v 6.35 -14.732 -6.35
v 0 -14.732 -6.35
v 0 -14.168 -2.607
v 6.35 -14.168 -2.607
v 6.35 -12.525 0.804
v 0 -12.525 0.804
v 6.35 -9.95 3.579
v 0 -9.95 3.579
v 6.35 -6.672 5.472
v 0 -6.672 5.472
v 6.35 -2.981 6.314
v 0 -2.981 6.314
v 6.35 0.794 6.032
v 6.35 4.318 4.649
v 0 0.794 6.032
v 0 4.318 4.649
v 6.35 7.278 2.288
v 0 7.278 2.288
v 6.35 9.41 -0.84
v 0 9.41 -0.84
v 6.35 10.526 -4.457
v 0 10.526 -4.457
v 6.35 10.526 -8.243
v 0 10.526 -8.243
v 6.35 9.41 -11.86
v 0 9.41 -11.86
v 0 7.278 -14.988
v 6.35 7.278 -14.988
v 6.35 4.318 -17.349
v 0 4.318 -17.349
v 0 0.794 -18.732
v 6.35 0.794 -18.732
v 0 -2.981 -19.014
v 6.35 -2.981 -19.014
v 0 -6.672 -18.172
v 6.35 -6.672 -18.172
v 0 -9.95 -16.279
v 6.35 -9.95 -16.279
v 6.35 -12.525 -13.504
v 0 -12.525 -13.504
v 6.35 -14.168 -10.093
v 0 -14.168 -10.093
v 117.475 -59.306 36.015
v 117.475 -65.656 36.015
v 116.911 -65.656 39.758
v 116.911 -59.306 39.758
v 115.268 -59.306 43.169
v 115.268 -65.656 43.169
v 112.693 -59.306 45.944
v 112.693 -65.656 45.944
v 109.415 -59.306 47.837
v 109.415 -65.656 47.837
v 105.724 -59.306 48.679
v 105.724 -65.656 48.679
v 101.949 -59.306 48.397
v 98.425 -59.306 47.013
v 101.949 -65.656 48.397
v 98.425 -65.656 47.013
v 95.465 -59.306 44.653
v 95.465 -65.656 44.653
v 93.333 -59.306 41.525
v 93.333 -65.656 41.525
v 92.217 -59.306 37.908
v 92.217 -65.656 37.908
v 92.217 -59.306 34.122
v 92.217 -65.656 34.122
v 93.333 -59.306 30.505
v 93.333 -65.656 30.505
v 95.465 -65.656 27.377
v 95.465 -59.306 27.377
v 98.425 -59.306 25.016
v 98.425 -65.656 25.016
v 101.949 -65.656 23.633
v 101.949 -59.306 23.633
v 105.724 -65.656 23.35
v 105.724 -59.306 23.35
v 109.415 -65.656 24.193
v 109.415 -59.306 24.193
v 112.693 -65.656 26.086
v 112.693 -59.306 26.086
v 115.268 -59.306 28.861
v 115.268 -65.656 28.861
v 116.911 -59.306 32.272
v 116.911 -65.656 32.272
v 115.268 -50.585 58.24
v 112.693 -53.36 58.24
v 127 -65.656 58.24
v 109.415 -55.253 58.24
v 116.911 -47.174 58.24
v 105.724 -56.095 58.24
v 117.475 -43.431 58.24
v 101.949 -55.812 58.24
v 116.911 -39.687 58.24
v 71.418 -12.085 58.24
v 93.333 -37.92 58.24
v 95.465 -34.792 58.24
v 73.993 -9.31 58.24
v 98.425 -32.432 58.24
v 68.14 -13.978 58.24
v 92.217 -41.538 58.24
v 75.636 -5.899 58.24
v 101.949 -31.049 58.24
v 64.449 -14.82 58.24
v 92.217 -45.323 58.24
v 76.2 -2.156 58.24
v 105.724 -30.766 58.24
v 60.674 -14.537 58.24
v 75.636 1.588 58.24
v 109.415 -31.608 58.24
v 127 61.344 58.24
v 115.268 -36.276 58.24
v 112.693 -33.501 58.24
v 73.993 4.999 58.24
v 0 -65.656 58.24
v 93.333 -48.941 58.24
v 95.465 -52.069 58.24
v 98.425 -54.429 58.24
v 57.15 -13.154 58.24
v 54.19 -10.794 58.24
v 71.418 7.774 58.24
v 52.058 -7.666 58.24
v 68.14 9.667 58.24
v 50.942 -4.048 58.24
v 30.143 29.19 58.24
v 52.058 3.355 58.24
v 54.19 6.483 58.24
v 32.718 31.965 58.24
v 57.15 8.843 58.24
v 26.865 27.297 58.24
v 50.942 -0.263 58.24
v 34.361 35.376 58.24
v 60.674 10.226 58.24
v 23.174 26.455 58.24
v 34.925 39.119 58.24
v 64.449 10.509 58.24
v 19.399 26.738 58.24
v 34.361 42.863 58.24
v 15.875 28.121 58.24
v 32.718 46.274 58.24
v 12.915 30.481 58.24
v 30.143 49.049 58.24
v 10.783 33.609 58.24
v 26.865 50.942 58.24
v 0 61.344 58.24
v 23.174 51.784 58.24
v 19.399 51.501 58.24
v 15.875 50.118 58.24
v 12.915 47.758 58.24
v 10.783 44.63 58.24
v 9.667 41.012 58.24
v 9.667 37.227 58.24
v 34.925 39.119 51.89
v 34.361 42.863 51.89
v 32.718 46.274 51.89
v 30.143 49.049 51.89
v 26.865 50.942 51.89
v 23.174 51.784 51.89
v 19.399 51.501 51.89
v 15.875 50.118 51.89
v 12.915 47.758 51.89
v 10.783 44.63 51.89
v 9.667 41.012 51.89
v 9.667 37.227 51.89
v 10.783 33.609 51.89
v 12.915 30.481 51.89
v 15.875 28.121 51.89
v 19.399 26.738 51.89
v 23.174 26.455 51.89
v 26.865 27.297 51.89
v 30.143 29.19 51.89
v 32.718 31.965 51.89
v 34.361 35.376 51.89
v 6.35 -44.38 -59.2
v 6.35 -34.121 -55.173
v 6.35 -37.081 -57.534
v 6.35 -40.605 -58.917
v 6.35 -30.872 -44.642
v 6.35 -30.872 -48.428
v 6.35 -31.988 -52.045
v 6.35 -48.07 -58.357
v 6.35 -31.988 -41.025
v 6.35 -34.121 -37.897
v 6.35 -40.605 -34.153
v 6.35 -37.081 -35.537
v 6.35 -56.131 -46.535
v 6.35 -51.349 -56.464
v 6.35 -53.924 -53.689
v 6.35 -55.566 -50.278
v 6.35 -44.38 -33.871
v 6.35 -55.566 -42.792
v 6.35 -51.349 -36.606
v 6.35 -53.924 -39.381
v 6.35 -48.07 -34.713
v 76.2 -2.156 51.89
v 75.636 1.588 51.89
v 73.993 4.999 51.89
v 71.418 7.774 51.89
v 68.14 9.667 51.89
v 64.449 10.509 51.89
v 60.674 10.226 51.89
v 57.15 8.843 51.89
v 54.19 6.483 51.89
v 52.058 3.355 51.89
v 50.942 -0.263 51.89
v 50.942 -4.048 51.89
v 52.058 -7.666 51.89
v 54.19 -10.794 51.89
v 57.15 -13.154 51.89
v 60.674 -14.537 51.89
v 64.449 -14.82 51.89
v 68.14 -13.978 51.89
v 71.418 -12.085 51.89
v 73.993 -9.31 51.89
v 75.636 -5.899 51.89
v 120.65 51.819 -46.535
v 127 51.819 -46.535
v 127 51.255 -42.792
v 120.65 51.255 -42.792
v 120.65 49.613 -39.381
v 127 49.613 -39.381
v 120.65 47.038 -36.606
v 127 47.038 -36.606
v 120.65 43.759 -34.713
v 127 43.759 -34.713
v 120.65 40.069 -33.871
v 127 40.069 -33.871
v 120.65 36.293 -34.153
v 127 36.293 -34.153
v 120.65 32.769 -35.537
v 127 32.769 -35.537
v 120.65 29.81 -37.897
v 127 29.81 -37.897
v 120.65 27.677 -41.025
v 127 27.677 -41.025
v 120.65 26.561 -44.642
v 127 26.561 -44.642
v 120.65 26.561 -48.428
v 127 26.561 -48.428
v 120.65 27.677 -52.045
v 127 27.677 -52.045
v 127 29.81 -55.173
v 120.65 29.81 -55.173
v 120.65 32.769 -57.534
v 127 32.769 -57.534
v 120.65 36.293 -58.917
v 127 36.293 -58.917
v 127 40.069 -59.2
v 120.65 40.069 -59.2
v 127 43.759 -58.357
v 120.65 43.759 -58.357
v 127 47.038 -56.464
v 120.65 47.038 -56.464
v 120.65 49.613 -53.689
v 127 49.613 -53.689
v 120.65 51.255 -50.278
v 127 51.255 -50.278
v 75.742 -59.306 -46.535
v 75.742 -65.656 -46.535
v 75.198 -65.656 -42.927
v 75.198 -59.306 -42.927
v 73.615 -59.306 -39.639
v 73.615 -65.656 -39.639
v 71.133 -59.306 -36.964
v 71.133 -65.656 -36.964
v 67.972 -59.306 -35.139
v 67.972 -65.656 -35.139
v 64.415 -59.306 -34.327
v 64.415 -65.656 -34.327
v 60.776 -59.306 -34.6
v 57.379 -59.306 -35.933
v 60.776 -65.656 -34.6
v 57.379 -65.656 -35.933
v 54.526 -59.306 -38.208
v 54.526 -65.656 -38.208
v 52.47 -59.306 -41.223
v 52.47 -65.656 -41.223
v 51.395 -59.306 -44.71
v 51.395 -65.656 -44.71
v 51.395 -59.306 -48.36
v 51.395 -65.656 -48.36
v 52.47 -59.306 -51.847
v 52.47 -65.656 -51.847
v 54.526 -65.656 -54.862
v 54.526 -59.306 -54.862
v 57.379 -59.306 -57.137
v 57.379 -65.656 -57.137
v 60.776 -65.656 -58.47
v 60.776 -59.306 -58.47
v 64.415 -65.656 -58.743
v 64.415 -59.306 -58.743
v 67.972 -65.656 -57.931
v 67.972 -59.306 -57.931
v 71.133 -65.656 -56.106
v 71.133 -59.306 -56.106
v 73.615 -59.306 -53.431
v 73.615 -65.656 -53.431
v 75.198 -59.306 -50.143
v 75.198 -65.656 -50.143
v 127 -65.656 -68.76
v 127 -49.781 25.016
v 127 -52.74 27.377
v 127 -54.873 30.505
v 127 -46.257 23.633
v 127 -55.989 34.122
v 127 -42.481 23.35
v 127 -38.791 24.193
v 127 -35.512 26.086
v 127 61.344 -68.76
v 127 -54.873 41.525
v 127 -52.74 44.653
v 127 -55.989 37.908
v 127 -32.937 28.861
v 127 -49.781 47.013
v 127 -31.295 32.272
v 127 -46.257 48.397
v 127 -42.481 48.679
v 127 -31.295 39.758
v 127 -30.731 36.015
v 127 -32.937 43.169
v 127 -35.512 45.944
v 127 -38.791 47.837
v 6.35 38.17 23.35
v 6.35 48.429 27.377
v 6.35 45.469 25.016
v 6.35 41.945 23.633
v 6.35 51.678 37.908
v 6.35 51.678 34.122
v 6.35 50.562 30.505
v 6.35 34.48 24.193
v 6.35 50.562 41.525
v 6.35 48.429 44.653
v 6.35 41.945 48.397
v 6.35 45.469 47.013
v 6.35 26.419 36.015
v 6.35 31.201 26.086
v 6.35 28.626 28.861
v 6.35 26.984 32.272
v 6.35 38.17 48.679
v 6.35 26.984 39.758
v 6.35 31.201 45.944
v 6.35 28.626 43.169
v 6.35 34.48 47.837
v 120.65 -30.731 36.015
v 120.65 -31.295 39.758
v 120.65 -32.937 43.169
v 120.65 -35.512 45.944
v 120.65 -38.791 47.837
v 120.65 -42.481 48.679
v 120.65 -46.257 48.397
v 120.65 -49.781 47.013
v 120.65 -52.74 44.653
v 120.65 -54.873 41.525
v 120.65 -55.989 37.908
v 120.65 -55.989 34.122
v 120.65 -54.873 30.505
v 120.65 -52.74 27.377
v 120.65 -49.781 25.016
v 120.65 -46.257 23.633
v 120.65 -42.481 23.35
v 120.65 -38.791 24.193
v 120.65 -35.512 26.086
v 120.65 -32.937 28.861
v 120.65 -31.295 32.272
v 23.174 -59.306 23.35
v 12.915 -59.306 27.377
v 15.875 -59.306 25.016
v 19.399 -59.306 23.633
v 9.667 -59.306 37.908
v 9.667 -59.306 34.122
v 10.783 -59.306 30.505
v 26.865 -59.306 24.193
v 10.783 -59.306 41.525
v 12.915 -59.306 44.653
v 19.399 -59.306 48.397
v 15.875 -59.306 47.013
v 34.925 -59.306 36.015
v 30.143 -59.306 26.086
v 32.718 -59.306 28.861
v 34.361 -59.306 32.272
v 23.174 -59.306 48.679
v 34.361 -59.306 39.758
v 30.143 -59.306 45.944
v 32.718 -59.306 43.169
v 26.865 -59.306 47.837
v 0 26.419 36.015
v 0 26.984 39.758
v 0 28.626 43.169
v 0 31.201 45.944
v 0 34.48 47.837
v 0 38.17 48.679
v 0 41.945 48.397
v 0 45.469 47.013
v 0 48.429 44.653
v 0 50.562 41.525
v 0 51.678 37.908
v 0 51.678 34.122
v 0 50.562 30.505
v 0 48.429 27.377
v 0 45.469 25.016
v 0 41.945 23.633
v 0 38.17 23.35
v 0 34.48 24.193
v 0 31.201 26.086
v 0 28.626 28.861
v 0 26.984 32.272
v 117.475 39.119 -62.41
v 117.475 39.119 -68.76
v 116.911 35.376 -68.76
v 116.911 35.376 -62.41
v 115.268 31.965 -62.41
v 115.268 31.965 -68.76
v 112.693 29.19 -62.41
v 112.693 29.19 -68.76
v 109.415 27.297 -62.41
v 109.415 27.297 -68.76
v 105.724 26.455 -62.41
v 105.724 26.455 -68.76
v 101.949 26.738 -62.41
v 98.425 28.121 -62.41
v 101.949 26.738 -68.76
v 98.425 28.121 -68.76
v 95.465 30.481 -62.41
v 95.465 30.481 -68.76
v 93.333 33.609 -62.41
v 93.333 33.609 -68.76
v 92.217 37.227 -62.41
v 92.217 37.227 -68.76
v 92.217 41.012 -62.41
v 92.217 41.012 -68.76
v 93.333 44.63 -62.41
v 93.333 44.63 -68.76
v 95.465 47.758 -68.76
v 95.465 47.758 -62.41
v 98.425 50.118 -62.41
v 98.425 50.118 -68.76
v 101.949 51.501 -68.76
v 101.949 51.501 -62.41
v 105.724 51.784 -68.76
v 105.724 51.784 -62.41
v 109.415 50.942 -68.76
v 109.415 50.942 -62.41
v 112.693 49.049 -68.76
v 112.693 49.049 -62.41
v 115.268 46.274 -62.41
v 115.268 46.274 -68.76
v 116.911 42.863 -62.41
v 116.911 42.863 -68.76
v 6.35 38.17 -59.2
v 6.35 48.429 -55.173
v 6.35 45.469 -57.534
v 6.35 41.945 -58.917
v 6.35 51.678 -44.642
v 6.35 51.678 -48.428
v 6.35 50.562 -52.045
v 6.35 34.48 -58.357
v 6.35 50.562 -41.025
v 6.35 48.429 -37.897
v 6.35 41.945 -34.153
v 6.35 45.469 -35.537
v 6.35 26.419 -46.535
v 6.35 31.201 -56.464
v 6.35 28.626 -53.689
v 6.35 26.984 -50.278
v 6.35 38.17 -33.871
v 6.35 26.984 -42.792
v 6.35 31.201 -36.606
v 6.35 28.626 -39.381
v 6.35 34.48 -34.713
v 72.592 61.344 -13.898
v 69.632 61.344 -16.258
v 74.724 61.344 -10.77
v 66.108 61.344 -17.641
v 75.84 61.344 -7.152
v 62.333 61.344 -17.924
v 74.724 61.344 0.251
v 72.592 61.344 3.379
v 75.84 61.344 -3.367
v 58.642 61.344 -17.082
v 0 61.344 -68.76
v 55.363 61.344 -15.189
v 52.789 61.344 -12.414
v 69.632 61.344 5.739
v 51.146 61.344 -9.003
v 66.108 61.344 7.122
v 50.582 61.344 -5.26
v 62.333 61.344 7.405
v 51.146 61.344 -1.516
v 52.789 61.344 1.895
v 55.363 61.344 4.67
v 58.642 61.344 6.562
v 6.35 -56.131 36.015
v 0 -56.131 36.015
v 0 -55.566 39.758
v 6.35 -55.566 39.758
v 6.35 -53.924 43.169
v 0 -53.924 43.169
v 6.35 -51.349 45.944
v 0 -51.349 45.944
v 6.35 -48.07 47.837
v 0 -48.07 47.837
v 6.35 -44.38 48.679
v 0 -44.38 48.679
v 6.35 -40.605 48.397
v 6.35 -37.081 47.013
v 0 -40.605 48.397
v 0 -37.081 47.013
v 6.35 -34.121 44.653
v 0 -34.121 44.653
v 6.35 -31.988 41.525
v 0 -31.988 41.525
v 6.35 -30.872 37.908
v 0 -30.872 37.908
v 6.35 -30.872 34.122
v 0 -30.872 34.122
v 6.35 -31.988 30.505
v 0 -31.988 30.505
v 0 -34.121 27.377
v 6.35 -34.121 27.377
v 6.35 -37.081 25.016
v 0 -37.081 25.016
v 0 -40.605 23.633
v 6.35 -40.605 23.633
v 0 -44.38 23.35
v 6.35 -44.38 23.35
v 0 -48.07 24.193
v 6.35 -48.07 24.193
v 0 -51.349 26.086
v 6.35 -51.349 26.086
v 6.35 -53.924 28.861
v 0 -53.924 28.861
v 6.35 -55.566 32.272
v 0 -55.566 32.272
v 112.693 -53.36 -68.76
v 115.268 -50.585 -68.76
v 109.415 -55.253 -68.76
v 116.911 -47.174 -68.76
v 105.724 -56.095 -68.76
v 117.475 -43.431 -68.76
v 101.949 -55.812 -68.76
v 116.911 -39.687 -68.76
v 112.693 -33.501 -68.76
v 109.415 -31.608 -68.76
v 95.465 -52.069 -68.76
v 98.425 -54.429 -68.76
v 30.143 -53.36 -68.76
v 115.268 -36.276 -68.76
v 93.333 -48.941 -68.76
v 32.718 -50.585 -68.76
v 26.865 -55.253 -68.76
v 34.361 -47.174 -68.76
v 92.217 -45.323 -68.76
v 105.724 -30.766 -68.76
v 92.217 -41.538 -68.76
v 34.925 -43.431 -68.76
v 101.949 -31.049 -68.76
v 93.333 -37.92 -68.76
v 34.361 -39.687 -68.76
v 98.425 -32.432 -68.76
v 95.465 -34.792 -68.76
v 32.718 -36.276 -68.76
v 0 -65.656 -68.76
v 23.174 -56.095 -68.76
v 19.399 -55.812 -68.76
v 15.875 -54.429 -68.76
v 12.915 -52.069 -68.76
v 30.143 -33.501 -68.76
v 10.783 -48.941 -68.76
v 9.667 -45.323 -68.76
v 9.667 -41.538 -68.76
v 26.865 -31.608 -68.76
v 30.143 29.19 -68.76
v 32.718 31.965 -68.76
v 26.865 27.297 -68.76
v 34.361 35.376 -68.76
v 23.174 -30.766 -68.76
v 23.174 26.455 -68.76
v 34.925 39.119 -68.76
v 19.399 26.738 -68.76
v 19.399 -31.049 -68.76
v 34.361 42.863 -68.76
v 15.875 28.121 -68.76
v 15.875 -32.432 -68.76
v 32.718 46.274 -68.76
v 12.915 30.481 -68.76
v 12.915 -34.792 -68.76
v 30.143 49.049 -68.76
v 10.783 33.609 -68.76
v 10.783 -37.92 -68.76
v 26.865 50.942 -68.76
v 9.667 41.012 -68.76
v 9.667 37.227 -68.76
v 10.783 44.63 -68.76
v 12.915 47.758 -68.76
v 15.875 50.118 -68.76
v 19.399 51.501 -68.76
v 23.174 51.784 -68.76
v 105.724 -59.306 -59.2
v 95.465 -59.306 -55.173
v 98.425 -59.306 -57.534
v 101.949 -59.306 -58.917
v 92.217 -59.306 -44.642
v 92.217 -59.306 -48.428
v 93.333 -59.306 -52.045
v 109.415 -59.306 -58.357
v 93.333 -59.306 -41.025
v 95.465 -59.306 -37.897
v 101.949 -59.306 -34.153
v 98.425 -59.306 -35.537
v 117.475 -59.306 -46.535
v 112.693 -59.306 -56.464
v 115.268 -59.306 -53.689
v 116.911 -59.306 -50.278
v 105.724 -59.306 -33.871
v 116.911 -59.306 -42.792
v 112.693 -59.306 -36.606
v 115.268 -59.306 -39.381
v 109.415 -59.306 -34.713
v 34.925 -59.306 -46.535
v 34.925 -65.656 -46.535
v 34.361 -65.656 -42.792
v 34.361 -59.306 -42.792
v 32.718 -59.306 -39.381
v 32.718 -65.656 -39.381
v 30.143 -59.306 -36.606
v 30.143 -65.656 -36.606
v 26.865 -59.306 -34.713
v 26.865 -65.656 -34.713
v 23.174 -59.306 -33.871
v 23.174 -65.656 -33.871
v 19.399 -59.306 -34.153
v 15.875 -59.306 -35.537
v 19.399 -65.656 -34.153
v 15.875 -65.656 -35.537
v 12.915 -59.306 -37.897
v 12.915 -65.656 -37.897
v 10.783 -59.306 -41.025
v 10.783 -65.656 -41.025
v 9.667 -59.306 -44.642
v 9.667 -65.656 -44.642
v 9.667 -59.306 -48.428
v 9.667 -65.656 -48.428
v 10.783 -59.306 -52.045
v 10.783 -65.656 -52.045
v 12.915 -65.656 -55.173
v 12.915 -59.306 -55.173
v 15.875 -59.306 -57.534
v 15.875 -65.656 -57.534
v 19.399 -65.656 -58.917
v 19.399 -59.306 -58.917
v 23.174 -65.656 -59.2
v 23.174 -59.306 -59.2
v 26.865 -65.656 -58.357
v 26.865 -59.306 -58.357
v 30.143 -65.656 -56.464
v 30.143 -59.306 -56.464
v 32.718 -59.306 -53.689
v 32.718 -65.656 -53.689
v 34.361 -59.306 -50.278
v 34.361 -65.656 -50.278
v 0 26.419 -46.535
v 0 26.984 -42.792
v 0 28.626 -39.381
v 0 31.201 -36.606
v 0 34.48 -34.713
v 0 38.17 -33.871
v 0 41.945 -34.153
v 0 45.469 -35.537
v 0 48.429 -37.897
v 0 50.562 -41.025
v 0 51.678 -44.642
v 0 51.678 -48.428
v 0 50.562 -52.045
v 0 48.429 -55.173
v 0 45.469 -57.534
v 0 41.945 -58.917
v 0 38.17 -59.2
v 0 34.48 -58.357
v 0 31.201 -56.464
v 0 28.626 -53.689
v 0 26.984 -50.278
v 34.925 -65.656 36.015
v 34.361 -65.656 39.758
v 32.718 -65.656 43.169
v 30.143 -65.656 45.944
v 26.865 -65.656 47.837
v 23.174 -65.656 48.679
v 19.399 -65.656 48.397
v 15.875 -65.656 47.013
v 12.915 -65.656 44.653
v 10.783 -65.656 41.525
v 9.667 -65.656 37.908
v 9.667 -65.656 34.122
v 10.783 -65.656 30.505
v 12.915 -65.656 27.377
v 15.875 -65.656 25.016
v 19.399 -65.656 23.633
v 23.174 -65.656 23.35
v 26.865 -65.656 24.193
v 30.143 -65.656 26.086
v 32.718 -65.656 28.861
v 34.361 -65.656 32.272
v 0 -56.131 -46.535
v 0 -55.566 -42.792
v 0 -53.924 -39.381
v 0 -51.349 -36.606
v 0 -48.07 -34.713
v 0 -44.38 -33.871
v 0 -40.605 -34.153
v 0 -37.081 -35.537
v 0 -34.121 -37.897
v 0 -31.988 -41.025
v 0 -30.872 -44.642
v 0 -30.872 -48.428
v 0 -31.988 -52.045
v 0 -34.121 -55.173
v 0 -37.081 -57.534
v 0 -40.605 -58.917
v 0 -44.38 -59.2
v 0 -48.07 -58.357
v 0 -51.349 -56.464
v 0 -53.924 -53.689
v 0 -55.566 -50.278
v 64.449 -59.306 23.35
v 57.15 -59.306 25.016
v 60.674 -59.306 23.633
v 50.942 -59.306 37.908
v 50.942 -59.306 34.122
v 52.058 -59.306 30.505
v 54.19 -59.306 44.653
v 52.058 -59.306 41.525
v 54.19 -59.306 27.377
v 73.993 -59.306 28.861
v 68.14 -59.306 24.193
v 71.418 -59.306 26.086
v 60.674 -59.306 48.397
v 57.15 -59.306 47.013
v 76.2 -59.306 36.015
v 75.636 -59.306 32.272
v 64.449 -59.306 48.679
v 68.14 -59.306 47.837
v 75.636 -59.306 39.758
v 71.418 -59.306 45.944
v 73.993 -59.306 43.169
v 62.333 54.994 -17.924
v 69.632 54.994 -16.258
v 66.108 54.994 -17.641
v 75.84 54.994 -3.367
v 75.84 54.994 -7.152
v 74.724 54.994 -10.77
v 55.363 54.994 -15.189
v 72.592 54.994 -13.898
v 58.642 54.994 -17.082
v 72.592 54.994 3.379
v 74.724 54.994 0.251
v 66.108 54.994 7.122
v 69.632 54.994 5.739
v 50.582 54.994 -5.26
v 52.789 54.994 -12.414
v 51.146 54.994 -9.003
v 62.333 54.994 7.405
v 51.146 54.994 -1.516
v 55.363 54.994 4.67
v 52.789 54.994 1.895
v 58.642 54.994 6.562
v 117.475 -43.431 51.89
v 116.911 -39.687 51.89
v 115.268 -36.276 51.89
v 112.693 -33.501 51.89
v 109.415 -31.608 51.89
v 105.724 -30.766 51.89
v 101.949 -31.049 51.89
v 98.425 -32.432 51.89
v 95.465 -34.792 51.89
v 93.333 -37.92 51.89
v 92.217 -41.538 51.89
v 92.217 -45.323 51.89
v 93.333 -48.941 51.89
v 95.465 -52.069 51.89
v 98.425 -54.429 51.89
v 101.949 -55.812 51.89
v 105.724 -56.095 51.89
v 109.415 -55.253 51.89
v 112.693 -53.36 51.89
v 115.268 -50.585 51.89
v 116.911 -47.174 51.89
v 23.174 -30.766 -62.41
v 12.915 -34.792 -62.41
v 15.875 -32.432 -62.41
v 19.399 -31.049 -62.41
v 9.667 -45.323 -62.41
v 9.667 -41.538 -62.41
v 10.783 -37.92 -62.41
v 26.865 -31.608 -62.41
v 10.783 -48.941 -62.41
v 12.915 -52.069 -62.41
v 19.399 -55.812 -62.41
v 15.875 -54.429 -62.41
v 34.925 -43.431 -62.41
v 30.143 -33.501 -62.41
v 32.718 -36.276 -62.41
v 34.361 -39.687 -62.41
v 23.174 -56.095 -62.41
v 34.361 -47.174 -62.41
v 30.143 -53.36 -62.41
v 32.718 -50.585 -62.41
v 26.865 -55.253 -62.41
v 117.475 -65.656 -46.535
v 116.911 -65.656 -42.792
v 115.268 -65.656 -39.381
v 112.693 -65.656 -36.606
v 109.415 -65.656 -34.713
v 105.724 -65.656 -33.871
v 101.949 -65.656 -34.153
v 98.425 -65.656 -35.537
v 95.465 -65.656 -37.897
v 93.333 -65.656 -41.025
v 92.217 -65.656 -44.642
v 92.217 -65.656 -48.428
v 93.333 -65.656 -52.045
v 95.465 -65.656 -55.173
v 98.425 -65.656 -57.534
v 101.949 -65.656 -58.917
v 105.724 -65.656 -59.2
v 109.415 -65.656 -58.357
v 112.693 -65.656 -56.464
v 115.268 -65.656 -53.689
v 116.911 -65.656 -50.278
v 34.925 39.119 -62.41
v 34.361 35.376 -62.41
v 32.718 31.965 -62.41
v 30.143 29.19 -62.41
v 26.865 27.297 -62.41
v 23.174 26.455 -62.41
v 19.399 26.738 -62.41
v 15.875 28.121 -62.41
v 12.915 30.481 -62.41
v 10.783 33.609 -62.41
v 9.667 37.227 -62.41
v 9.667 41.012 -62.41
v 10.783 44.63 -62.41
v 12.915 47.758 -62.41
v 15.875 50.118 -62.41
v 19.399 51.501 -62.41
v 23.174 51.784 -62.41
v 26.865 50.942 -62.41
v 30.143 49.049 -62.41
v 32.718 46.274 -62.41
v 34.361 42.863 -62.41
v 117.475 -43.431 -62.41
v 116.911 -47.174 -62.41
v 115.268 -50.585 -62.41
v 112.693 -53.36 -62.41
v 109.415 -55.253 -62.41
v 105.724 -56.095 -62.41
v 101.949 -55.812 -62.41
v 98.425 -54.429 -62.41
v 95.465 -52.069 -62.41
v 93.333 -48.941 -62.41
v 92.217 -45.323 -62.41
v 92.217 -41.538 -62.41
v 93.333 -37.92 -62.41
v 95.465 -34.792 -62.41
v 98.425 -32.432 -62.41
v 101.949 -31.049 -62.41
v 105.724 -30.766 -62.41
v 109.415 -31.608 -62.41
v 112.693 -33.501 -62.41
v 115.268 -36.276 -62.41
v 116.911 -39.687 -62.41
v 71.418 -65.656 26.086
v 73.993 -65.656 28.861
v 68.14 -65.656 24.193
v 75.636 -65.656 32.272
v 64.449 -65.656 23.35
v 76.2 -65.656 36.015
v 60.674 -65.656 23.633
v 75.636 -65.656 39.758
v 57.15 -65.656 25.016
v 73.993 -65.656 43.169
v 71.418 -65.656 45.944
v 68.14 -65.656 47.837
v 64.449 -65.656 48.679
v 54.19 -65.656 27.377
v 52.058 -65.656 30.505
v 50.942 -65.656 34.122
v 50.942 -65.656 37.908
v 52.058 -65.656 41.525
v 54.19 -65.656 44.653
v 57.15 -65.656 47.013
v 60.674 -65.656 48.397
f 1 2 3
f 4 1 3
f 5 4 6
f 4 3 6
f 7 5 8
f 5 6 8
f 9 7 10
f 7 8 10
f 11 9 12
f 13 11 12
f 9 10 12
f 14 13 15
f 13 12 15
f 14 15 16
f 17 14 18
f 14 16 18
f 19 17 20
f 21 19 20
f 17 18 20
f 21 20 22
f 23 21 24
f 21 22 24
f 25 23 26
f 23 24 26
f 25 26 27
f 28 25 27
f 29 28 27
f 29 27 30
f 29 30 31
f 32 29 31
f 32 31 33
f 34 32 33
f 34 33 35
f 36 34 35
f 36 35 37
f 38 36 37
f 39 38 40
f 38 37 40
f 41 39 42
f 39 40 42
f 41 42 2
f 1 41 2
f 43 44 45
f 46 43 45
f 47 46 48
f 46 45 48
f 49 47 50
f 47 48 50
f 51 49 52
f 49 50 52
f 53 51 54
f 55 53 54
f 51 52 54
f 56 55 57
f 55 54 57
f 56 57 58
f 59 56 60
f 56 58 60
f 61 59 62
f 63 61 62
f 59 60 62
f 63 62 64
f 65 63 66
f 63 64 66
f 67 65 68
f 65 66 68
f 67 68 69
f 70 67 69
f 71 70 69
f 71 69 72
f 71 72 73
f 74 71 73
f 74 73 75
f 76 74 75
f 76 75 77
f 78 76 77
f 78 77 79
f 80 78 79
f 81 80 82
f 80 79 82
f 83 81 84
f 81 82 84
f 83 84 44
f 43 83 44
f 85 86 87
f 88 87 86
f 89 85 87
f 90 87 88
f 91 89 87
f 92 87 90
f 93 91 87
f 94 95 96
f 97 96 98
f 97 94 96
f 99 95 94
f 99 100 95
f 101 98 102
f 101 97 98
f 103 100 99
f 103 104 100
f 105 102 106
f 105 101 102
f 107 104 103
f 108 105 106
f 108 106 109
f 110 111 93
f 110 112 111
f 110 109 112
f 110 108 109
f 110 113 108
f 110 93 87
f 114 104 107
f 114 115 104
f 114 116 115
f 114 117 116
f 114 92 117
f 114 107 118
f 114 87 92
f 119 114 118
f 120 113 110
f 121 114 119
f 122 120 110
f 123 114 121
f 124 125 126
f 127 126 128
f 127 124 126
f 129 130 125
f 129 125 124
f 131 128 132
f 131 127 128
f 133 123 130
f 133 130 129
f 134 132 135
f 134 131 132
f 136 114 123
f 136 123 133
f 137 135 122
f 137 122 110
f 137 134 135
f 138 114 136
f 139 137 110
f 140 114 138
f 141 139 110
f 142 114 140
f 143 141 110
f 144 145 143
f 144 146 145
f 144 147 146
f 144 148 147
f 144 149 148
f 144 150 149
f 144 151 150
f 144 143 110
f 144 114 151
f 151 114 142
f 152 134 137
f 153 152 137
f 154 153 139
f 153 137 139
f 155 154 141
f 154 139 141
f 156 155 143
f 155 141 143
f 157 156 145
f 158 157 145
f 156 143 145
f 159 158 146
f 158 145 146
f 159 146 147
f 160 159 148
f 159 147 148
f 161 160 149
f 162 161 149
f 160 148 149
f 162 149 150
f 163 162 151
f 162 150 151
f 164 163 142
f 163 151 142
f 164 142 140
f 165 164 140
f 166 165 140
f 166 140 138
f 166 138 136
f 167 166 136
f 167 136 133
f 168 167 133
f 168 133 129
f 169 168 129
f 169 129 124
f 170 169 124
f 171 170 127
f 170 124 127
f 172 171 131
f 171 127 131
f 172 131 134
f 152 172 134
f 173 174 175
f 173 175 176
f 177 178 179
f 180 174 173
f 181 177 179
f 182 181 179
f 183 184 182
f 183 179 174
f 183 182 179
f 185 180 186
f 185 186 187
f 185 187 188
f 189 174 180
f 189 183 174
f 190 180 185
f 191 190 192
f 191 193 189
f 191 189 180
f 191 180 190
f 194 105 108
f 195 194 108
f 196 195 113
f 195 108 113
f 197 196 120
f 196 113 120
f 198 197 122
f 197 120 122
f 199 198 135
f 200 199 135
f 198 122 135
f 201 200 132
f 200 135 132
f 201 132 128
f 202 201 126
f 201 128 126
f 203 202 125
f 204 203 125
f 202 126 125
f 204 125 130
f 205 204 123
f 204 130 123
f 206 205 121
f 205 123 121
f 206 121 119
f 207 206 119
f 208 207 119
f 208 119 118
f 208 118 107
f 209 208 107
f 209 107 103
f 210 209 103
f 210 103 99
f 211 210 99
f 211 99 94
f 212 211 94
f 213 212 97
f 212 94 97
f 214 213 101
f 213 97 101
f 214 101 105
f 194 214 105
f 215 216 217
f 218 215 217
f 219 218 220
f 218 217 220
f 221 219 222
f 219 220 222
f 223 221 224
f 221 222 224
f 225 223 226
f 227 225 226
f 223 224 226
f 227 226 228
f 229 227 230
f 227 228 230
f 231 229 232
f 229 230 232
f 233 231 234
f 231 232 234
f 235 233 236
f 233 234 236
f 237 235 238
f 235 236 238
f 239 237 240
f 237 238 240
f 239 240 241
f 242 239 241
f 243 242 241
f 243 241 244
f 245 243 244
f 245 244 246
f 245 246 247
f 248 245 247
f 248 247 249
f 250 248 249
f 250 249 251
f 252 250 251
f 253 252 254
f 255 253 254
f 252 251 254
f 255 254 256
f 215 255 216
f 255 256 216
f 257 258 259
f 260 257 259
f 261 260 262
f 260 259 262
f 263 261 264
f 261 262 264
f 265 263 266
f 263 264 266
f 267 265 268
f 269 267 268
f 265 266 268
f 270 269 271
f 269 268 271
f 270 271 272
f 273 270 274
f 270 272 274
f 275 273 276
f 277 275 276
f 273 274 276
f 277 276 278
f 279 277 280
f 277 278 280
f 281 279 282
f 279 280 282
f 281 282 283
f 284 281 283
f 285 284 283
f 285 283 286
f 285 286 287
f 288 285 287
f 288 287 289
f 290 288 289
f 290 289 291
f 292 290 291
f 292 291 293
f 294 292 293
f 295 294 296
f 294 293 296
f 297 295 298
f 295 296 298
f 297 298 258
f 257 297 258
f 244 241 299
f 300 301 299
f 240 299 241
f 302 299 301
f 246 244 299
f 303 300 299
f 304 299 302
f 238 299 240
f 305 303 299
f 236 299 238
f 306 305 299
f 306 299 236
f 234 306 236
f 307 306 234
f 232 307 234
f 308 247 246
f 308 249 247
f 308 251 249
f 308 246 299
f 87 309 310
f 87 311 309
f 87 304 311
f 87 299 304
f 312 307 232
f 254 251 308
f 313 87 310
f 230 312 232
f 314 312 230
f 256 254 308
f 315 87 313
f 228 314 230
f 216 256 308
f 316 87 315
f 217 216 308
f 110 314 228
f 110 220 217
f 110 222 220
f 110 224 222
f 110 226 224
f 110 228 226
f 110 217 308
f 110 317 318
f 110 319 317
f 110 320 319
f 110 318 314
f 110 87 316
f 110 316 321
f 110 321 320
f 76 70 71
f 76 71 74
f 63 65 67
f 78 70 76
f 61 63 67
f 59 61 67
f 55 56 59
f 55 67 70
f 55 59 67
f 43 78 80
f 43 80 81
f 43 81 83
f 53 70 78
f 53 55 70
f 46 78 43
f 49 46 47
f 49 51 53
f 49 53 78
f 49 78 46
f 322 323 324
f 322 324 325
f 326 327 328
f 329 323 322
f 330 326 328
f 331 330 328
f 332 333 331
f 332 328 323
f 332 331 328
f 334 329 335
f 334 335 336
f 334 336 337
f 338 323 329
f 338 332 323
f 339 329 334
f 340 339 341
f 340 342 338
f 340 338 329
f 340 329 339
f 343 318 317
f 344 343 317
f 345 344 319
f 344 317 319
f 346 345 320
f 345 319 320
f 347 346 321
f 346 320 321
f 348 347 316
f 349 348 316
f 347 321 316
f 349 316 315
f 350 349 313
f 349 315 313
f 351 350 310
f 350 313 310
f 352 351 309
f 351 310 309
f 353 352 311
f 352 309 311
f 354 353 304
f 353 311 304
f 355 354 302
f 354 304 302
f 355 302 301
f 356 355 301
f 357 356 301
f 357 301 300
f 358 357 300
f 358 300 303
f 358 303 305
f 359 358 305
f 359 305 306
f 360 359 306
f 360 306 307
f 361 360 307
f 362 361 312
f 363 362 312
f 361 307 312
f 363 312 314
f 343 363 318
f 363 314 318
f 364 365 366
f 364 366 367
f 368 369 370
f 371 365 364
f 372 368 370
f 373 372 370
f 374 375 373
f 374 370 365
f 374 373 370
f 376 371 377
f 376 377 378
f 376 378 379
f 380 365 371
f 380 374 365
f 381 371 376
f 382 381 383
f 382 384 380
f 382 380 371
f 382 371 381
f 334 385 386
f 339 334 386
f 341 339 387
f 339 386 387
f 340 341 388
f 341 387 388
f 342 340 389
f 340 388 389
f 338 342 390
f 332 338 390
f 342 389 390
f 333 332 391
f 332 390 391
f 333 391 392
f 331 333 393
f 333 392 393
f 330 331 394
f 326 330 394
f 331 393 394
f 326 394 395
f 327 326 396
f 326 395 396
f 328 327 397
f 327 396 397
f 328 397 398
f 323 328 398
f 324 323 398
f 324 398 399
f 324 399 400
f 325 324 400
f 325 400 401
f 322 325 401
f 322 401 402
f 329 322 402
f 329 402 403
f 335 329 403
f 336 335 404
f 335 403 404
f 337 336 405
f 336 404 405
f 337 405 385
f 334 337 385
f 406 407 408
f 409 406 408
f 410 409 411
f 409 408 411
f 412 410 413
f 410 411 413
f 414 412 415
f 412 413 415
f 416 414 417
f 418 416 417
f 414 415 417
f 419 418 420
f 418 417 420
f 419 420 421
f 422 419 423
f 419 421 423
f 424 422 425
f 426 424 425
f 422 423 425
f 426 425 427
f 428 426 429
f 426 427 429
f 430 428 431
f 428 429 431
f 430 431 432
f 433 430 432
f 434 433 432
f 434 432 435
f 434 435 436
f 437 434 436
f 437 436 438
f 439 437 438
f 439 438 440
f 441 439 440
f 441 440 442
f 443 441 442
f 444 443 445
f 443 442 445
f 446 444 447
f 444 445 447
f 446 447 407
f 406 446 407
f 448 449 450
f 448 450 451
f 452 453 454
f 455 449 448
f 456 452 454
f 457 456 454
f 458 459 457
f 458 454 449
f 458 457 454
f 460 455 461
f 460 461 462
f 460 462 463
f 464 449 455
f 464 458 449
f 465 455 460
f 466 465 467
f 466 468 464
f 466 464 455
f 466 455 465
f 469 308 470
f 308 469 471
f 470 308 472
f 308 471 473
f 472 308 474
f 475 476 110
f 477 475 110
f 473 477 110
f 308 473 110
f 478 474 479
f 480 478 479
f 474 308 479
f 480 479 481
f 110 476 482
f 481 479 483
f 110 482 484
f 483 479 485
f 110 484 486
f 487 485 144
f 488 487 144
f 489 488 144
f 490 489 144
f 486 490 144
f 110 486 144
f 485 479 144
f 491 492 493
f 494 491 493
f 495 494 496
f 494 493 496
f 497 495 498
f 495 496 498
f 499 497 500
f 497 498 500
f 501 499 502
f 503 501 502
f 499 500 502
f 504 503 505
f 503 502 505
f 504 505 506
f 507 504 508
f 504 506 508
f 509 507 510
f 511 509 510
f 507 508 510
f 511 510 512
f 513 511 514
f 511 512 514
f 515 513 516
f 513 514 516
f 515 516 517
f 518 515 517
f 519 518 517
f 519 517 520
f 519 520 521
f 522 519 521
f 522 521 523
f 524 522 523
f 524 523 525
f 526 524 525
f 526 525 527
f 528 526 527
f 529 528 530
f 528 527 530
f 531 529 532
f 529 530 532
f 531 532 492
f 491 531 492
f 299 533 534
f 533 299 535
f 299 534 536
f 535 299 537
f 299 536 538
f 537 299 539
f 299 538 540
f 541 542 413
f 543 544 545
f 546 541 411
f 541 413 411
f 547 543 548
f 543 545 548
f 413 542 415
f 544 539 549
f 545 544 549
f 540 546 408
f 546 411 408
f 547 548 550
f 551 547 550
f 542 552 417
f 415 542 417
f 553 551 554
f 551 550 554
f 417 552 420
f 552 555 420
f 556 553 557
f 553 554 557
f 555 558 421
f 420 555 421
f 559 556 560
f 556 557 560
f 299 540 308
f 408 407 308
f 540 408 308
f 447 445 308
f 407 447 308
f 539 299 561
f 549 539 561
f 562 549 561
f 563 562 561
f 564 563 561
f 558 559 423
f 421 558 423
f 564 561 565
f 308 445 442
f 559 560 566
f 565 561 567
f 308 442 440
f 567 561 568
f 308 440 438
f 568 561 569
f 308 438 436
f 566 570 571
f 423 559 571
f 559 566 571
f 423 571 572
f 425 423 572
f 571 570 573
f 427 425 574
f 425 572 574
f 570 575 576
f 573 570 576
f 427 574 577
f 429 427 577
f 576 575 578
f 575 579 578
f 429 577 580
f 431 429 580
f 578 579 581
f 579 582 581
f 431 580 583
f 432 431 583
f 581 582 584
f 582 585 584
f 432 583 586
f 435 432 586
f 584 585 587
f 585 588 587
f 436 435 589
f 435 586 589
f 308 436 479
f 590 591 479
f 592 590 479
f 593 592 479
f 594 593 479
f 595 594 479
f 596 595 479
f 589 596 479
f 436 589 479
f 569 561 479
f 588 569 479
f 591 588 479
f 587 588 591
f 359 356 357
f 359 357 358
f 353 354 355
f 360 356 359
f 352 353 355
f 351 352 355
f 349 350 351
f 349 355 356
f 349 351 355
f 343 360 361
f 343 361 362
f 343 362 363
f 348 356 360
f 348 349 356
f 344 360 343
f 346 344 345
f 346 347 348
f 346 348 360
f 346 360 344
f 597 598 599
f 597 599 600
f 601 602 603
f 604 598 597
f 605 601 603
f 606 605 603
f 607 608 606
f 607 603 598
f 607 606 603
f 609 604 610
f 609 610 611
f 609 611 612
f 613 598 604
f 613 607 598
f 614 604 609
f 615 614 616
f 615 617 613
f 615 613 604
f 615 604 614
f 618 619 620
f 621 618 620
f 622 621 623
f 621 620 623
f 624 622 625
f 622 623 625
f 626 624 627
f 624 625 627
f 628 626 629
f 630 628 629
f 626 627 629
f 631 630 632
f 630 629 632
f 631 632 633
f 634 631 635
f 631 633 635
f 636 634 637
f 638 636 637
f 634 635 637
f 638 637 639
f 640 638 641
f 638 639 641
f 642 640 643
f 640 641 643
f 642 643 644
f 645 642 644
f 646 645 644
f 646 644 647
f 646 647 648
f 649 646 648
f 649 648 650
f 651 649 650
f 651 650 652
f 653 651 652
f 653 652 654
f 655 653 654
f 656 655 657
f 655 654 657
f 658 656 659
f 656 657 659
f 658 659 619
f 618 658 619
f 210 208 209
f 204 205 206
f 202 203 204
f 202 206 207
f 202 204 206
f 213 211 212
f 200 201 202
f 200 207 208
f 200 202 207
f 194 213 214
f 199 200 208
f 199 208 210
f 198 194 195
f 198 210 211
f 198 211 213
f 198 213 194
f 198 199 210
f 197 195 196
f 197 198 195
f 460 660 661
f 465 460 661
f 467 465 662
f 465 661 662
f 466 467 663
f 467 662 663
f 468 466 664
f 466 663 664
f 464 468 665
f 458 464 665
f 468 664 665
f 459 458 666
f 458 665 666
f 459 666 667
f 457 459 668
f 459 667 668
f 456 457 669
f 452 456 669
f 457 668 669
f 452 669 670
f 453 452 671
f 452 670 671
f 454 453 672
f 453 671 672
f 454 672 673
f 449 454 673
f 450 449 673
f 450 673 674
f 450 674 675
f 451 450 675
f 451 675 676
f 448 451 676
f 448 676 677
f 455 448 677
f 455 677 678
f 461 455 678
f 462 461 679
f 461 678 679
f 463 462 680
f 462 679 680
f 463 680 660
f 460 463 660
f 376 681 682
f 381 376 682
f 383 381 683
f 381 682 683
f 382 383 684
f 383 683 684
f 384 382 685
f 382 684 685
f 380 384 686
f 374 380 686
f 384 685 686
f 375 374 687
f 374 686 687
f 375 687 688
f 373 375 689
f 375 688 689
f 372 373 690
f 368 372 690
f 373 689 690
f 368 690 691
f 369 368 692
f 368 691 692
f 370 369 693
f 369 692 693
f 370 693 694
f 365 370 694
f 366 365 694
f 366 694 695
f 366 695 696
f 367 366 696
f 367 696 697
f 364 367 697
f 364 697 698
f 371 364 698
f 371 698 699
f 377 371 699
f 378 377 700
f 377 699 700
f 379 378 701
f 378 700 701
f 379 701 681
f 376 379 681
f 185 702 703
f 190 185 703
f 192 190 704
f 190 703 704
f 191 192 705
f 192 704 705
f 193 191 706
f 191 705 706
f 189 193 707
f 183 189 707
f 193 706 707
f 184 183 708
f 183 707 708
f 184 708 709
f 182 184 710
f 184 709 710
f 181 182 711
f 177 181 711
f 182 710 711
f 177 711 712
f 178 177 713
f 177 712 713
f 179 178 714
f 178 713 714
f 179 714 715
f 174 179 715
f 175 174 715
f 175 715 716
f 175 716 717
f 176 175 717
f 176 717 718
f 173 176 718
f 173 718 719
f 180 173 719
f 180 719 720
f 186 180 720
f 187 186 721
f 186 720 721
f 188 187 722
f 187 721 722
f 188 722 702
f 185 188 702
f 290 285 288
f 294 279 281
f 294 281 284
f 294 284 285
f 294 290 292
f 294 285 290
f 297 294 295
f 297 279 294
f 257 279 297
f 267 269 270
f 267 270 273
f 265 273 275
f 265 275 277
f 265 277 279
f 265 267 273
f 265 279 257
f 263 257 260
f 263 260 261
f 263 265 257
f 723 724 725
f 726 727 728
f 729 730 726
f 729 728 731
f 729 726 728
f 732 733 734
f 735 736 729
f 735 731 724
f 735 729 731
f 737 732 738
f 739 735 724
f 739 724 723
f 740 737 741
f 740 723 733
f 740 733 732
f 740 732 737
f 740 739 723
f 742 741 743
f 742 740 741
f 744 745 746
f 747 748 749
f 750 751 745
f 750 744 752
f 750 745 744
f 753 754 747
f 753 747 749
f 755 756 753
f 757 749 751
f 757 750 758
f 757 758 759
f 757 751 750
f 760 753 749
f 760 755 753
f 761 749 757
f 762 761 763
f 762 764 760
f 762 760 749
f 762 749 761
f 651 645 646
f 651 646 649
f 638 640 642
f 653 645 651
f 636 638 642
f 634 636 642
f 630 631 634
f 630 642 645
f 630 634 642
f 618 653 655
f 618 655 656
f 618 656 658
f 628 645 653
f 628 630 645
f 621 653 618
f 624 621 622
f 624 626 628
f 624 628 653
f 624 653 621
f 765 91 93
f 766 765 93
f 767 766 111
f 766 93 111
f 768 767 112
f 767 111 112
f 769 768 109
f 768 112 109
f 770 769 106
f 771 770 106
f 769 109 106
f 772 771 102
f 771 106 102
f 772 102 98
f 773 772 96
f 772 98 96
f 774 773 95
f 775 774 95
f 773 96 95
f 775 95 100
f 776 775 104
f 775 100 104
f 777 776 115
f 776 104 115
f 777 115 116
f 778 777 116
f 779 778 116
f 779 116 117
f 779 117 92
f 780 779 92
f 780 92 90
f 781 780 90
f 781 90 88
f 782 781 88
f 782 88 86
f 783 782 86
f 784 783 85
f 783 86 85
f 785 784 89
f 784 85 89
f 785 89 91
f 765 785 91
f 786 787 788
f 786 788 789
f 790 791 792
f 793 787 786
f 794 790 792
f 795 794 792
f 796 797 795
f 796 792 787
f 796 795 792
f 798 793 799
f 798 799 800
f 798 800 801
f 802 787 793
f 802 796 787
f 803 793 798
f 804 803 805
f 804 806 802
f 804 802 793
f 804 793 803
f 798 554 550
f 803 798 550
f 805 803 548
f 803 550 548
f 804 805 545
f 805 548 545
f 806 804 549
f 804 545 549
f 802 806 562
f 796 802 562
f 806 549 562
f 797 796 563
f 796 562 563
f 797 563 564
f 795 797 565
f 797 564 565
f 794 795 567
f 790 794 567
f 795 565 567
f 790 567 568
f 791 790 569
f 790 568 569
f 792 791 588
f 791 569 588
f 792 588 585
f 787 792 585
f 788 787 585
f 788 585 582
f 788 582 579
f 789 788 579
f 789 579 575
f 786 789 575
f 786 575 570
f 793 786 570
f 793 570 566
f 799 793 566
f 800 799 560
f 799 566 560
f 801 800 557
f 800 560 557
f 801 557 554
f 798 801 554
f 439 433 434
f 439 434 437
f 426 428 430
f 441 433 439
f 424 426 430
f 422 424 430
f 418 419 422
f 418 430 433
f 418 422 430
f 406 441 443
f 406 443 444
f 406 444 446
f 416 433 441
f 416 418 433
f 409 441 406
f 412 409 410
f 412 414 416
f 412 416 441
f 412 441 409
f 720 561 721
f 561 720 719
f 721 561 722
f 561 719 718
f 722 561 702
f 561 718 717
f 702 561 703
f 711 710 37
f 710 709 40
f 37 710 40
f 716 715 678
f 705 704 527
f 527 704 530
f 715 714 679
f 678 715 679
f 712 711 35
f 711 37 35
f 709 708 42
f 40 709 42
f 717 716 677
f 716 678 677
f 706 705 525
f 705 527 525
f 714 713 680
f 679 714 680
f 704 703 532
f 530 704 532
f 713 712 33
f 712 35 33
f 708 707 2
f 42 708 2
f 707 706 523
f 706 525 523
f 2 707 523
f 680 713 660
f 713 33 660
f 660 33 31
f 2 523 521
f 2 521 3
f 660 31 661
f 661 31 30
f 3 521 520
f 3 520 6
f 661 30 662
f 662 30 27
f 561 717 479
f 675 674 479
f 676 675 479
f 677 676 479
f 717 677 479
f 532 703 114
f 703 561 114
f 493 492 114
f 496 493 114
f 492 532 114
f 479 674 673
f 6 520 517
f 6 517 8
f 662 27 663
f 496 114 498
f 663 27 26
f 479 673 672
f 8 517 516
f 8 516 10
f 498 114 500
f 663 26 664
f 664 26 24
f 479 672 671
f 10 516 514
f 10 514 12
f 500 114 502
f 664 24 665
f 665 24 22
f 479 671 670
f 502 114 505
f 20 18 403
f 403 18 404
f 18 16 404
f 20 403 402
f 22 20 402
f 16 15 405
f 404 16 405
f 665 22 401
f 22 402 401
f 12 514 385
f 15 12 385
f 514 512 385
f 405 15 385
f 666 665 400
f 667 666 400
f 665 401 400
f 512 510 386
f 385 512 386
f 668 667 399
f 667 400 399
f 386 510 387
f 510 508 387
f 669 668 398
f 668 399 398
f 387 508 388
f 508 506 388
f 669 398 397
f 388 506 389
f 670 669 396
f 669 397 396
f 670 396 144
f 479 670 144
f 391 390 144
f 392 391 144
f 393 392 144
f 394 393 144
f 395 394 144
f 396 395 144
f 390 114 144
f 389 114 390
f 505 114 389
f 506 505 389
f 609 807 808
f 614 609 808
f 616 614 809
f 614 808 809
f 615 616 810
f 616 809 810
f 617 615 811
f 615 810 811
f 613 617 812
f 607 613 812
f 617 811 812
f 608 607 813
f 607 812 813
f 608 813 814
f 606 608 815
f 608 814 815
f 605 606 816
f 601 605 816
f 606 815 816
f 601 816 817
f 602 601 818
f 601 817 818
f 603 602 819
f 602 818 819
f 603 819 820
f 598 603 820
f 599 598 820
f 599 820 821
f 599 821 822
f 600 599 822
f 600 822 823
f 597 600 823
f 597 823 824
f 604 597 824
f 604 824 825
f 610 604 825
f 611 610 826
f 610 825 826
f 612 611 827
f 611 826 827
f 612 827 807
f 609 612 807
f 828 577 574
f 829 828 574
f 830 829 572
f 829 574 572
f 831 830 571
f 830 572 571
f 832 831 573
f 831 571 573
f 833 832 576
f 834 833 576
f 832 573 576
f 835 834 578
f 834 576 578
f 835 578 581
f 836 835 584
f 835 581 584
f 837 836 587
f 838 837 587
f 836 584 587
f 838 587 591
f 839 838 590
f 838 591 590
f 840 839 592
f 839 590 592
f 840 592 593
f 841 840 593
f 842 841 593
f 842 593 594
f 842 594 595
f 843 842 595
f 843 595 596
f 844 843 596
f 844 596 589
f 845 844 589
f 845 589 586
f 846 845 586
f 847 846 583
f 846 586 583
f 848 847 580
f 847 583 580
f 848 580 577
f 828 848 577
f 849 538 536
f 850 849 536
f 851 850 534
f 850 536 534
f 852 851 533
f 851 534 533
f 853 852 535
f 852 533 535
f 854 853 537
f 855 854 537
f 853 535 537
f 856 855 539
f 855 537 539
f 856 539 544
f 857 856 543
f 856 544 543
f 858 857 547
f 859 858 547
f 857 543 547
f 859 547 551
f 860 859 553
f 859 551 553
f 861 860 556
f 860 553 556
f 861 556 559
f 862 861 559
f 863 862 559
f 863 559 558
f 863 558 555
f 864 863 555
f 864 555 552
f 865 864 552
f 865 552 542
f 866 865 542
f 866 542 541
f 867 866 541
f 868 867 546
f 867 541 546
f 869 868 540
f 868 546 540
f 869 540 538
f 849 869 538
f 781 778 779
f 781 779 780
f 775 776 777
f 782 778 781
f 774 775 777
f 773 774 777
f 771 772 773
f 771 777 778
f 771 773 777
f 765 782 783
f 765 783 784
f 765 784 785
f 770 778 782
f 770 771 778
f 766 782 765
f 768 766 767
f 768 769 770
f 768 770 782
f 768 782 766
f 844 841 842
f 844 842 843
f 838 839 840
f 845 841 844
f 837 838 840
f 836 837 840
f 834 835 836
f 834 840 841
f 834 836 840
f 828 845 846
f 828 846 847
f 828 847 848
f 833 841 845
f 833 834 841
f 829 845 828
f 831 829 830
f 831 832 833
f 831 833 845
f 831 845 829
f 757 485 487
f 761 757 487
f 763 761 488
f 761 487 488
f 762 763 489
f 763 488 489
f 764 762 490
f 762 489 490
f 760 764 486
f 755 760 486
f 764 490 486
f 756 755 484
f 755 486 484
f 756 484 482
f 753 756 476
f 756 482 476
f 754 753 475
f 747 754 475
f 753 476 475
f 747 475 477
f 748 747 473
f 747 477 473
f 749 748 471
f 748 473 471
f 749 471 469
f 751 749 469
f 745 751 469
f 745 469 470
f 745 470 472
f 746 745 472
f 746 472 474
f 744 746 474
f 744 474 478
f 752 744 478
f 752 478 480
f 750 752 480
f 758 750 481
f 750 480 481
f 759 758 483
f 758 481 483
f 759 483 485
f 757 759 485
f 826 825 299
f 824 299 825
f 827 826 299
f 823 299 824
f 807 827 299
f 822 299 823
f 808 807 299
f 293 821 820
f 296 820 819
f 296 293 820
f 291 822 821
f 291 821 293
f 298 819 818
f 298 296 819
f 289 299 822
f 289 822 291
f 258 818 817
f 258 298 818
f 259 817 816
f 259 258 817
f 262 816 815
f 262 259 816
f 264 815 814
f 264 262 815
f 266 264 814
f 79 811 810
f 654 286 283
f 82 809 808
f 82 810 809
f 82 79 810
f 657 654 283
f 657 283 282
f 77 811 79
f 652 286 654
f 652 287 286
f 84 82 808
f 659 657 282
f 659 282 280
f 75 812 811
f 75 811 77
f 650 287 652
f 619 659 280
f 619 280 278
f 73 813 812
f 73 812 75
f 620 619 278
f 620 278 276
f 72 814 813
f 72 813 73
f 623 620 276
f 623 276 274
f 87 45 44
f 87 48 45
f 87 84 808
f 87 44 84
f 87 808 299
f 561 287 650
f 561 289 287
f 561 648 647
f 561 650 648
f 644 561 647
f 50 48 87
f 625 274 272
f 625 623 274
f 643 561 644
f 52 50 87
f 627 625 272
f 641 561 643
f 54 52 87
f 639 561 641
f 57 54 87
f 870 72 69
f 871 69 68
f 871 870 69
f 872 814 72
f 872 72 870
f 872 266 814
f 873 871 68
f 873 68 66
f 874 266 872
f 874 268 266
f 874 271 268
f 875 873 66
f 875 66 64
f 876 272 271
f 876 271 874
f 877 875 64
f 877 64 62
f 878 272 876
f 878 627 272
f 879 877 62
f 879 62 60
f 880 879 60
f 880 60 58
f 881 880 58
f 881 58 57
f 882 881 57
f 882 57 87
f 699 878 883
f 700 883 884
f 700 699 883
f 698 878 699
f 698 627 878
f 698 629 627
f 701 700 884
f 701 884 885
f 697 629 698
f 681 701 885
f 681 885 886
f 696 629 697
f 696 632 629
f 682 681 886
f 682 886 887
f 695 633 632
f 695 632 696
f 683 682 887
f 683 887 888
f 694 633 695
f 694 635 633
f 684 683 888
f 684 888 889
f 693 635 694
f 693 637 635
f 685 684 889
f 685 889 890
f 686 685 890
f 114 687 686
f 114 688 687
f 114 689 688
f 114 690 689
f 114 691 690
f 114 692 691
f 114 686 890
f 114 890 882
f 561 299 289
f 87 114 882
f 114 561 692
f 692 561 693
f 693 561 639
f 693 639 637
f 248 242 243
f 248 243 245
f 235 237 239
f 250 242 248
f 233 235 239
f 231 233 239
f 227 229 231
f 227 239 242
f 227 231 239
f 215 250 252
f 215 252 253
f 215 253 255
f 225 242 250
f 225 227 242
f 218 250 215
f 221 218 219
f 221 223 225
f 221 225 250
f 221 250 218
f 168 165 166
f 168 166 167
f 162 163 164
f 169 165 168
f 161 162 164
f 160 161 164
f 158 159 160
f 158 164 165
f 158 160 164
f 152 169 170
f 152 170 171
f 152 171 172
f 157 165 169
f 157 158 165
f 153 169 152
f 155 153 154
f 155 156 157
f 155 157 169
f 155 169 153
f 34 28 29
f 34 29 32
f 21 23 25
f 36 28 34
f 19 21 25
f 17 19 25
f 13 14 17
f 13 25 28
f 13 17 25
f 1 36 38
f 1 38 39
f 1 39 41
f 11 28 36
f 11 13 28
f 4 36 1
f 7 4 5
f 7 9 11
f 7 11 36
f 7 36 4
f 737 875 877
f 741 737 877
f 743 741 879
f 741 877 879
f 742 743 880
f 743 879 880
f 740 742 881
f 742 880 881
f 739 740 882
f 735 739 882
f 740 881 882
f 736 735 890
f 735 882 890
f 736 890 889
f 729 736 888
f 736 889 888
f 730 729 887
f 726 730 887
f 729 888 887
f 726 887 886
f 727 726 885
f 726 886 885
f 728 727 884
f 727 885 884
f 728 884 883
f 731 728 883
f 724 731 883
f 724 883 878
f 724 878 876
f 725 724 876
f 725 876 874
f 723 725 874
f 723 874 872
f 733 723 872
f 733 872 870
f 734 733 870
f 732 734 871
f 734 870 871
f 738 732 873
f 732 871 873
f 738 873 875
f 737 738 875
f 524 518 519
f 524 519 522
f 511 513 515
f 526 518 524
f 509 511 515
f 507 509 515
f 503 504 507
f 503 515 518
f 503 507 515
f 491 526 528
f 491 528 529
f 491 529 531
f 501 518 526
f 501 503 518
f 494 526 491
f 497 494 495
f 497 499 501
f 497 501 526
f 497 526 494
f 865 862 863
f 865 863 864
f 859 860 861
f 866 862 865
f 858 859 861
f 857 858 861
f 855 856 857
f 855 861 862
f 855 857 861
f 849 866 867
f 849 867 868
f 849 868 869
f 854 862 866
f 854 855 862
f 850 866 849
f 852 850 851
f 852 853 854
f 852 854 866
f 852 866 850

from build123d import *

# Parameters (mm, degrees)
F0_W      = 127
F0_H      = 127
F1_DEPTH  = 127
F2_R      = 12.7
F3_DEPTH  = 6.35
F4_R      = 12.7
F5_DEPTH  = 6.35
F6_R      = 12.7
F7_DEPTH  = 6.35
F8_R      = 12.7
F9_DEPTH  = 6.35
F10_R     = 12.7
F11_DEPTH = 6.35
F12_R     = 12.7
F13_DEPTH = 6.35
F14_R     = 12.7
F15_DEPTH = 6.35
F16_R     = 12.7
F17_DEPTH = 6.35
F18_R     = 12.7
F19_DEPTH = 6.35
F20_R     = 12.2418661496
F21_DEPTH = 6.35
F22_R     = 12.7
F23_DEPTH = 6.35
F25_R     = 12.7
F26_DEPTH = 6.35
F27_R     = 12.7
F28_DEPTH = 6.35
F29_R     = 12.7
F30_DEPTH = 6.35
F31_R     = 12.7
F32_DEPTH = 6.35
F33_R     = 12.7
F34_DEPTH = 6.35
F35_R     = 12.7
F36_DEPTH = 6.35
F37_R     = 12.7
F38_DEPTH = 6.35
F39_R     = 12.7
F40_DEPTH = 6.35
F41_R     = 12.7
F42_DEPTH = 6.35
F43_R     = 12.7
F44_DEPTH = 6.35


# Not quite as in the source:
# - a length typed as a fraction of an inch, garbled in the dataset ("3 / 203.2 mm" for 3/8 in), is restored


with BuildPart() as f1:
    # F0 (on Right) → F1 (new body)
    with BuildSketch(Plane.YZ):
        with Locations((-2.1555427632, -5.2600353956)):
            Rectangle(F0_W, F0_H)
    extrude(amount=F1_DEPTH)

    # F2 (on face) → F3 (cut)
    with BuildSketch(Plane(origin=(0, 61.3444572368, 0), x_dir=(-1, 0, 0), z_dir=(0, 1, 0))):
        with Locations((-63.2817981055, -5.2596604964)):
            Circle(F2_R)
    extrude(amount=-F3_DEPTH, mode=Mode.SUBTRACT)

    # F4 (on face) → F5 (cut)
    with BuildSketch(Plane(origin=(0, 0, 0), x_dir=(0, -1, 0), z_dir=(-1, 0, 0))):
        with Locations((2.032, -6.35)):
            Circle(F4_R)
    extrude(amount=-F5_DEPTH, mode=Mode.SUBTRACT)

    # F6 (on face) → F7 (cut)
    with BuildSketch(Plane(origin=(0, 0, 0), x_dir=(0, -1, 0), z_dir=(-1, 0, 0))):
        with Locations((-39.1194572368, 36.0149646044)):
            Circle(F6_R)
    extrude(amount=-F7_DEPTH, mode=Mode.SUBTRACT)

    # F8 (on face) → F9 (cut)
    with BuildSketch(Plane(origin=(0, 0, 0), x_dir=(0, -1, 0), z_dir=(-1, 0, 0))):
        with Locations((43.4305427632, 36.0149646044)):
            Circle(F8_R)
    extrude(amount=-F9_DEPTH, mode=Mode.SUBTRACT)

    # F10 (on face) → F11 (cut)
    with BuildSketch(Plane(origin=(0, 0, 0), x_dir=(0, -1, 0), z_dir=(-1, 0, 0))):
        with Locations((-39.1194572368, -46.5350353956)):
            Circle(F10_R)
    extrude(amount=-F11_DEPTH, mode=Mode.SUBTRACT)

    # F12 (on face) → F13 (cut)
    with BuildSketch(Plane(origin=(0, 0, 0), x_dir=(0, -1, 0), z_dir=(-1, 0, 0))):
        with Locations((43.4305427632, -46.5350353956)):
            Circle(F12_R)
    extrude(amount=-F13_DEPTH, mode=Mode.SUBTRACT)

    # F14 (on face) → F15 (cut)
    with BuildSketch(Plane.YZ.offset(127)):
        with Locations((39.1194572368, -46.5350353956)):
            Circle(F14_R)
    extrude(amount=-F15_DEPTH, mode=Mode.SUBTRACT)

    # F16 (on face) → F17 (cut)
    with BuildSketch(Plane.YZ.offset(127)):
        with Locations((-43.4305427632, 36.0149646044)):
            Circle(F16_R)
    extrude(amount=-F17_DEPTH, mode=Mode.SUBTRACT)

    # F18 (on face) → F19 (cut)
    with BuildSketch(Plane.XZ.offset(65.6555427632)):
        with Locations((104.775, -46.5350353956)):
            Circle(F18_R)
    extrude(amount=-F19_DEPTH, mode=Mode.SUBTRACT)

    # F20 (on face) → F21 (cut)
    with BuildSketch(Plane.XZ.offset(65.6555427632)):
        with Locations((63.5, -46.5350353956)):
            Circle(F20_R)
    extrude(amount=-F21_DEPTH, mode=Mode.SUBTRACT)

    # F22 (on face) → F23 (cut)
    with BuildSketch(Plane.XZ.offset(65.6555427632)):
        with Locations((22.225, -46.5350353956)):
            Circle(F22_R)
    extrude(amount=-F23_DEPTH, mode=Mode.SUBTRACT)

    # F25 (on face) → F26 (cut)
    with BuildSketch(Plane.XZ.offset(65.6555427632)):
        with Locations((104.775, 36.0149646044)):
            Circle(F25_R)
    extrude(amount=-F26_DEPTH, mode=Mode.SUBTRACT)

    # F27 (on face) → F28 (cut)
    with BuildSketch(Plane.XZ.offset(65.6555427632)):
        with Locations((63.5, 36.0149646044)):
            Circle(F27_R)
    extrude(amount=-F28_DEPTH, mode=Mode.SUBTRACT)

    # F29 (on face) → F30 (cut)
    with BuildSketch(Plane.XZ.offset(65.6555427632)):
        with Locations((22.225, 36.0149646044)):
            Circle(F29_R)
    extrude(amount=-F30_DEPTH, mode=Mode.SUBTRACT)

    # F31 (on face) → F32 (cut)
    with BuildSketch(Plane.XY.offset(58.2399646044)):
        with Locations((104.775, -43.4305427632)):
            Circle(F31_R)
    extrude(amount=-F32_DEPTH, mode=Mode.SUBTRACT)

    # F33 (on face) → F34 (cut)
    with BuildSketch(Plane.XY.offset(58.2399646044)):
        with Locations((63.5, -2.1555427632)):
            Circle(F33_R)
    extrude(amount=-F34_DEPTH, mode=Mode.SUBTRACT)

    # F35 (on face) → F36 (cut)
    with BuildSketch(Plane.XY.offset(58.2399646044)):
        with Locations((22.225, 39.1194572368)):
            Circle(F35_R)
    extrude(amount=-F36_DEPTH, mode=Mode.SUBTRACT)

    # F37 (on face) → F38 (cut)
    with BuildSketch(Plane(origin=(0, 0, -68.7600353956), x_dir=(1, 0, 0), z_dir=(0, 0, -1))):
        with Locations((104.775, 43.4305427632)):
            Circle(F37_R)
    extrude(amount=-F38_DEPTH, mode=Mode.SUBTRACT)

    # F39 (on face) → F40 (cut)
    with BuildSketch(Plane(origin=(0, 0, -68.7600353956), x_dir=(1, 0, 0), z_dir=(0, 0, -1))):
        with Locations((22.225, 43.4305427632)):
            Circle(F39_R)
    extrude(amount=-F40_DEPTH, mode=Mode.SUBTRACT)

    # F41 (on face) → F42 (cut)
    with BuildSketch(Plane(origin=(0, 0, -68.7600353956), x_dir=(1, 0, 0), z_dir=(0, 0, -1))):
        with Locations((22.225, -39.1194572368)):
            Circle(F41_R)
    extrude(amount=-F42_DEPTH, mode=Mode.SUBTRACT)

    # F43 (on face) → F44 (cut)
    with BuildSketch(Plane(origin=(0, 0, -68.7600353956), x_dir=(1, 0, 0), z_dir=(0, 0, -1))):
        with Locations((104.775, -39.1194572368)):
            Circle(F43_R)
    extrude(amount=-F44_DEPTH, mode=Mode.SUBTRACT)


solid = f1.part
